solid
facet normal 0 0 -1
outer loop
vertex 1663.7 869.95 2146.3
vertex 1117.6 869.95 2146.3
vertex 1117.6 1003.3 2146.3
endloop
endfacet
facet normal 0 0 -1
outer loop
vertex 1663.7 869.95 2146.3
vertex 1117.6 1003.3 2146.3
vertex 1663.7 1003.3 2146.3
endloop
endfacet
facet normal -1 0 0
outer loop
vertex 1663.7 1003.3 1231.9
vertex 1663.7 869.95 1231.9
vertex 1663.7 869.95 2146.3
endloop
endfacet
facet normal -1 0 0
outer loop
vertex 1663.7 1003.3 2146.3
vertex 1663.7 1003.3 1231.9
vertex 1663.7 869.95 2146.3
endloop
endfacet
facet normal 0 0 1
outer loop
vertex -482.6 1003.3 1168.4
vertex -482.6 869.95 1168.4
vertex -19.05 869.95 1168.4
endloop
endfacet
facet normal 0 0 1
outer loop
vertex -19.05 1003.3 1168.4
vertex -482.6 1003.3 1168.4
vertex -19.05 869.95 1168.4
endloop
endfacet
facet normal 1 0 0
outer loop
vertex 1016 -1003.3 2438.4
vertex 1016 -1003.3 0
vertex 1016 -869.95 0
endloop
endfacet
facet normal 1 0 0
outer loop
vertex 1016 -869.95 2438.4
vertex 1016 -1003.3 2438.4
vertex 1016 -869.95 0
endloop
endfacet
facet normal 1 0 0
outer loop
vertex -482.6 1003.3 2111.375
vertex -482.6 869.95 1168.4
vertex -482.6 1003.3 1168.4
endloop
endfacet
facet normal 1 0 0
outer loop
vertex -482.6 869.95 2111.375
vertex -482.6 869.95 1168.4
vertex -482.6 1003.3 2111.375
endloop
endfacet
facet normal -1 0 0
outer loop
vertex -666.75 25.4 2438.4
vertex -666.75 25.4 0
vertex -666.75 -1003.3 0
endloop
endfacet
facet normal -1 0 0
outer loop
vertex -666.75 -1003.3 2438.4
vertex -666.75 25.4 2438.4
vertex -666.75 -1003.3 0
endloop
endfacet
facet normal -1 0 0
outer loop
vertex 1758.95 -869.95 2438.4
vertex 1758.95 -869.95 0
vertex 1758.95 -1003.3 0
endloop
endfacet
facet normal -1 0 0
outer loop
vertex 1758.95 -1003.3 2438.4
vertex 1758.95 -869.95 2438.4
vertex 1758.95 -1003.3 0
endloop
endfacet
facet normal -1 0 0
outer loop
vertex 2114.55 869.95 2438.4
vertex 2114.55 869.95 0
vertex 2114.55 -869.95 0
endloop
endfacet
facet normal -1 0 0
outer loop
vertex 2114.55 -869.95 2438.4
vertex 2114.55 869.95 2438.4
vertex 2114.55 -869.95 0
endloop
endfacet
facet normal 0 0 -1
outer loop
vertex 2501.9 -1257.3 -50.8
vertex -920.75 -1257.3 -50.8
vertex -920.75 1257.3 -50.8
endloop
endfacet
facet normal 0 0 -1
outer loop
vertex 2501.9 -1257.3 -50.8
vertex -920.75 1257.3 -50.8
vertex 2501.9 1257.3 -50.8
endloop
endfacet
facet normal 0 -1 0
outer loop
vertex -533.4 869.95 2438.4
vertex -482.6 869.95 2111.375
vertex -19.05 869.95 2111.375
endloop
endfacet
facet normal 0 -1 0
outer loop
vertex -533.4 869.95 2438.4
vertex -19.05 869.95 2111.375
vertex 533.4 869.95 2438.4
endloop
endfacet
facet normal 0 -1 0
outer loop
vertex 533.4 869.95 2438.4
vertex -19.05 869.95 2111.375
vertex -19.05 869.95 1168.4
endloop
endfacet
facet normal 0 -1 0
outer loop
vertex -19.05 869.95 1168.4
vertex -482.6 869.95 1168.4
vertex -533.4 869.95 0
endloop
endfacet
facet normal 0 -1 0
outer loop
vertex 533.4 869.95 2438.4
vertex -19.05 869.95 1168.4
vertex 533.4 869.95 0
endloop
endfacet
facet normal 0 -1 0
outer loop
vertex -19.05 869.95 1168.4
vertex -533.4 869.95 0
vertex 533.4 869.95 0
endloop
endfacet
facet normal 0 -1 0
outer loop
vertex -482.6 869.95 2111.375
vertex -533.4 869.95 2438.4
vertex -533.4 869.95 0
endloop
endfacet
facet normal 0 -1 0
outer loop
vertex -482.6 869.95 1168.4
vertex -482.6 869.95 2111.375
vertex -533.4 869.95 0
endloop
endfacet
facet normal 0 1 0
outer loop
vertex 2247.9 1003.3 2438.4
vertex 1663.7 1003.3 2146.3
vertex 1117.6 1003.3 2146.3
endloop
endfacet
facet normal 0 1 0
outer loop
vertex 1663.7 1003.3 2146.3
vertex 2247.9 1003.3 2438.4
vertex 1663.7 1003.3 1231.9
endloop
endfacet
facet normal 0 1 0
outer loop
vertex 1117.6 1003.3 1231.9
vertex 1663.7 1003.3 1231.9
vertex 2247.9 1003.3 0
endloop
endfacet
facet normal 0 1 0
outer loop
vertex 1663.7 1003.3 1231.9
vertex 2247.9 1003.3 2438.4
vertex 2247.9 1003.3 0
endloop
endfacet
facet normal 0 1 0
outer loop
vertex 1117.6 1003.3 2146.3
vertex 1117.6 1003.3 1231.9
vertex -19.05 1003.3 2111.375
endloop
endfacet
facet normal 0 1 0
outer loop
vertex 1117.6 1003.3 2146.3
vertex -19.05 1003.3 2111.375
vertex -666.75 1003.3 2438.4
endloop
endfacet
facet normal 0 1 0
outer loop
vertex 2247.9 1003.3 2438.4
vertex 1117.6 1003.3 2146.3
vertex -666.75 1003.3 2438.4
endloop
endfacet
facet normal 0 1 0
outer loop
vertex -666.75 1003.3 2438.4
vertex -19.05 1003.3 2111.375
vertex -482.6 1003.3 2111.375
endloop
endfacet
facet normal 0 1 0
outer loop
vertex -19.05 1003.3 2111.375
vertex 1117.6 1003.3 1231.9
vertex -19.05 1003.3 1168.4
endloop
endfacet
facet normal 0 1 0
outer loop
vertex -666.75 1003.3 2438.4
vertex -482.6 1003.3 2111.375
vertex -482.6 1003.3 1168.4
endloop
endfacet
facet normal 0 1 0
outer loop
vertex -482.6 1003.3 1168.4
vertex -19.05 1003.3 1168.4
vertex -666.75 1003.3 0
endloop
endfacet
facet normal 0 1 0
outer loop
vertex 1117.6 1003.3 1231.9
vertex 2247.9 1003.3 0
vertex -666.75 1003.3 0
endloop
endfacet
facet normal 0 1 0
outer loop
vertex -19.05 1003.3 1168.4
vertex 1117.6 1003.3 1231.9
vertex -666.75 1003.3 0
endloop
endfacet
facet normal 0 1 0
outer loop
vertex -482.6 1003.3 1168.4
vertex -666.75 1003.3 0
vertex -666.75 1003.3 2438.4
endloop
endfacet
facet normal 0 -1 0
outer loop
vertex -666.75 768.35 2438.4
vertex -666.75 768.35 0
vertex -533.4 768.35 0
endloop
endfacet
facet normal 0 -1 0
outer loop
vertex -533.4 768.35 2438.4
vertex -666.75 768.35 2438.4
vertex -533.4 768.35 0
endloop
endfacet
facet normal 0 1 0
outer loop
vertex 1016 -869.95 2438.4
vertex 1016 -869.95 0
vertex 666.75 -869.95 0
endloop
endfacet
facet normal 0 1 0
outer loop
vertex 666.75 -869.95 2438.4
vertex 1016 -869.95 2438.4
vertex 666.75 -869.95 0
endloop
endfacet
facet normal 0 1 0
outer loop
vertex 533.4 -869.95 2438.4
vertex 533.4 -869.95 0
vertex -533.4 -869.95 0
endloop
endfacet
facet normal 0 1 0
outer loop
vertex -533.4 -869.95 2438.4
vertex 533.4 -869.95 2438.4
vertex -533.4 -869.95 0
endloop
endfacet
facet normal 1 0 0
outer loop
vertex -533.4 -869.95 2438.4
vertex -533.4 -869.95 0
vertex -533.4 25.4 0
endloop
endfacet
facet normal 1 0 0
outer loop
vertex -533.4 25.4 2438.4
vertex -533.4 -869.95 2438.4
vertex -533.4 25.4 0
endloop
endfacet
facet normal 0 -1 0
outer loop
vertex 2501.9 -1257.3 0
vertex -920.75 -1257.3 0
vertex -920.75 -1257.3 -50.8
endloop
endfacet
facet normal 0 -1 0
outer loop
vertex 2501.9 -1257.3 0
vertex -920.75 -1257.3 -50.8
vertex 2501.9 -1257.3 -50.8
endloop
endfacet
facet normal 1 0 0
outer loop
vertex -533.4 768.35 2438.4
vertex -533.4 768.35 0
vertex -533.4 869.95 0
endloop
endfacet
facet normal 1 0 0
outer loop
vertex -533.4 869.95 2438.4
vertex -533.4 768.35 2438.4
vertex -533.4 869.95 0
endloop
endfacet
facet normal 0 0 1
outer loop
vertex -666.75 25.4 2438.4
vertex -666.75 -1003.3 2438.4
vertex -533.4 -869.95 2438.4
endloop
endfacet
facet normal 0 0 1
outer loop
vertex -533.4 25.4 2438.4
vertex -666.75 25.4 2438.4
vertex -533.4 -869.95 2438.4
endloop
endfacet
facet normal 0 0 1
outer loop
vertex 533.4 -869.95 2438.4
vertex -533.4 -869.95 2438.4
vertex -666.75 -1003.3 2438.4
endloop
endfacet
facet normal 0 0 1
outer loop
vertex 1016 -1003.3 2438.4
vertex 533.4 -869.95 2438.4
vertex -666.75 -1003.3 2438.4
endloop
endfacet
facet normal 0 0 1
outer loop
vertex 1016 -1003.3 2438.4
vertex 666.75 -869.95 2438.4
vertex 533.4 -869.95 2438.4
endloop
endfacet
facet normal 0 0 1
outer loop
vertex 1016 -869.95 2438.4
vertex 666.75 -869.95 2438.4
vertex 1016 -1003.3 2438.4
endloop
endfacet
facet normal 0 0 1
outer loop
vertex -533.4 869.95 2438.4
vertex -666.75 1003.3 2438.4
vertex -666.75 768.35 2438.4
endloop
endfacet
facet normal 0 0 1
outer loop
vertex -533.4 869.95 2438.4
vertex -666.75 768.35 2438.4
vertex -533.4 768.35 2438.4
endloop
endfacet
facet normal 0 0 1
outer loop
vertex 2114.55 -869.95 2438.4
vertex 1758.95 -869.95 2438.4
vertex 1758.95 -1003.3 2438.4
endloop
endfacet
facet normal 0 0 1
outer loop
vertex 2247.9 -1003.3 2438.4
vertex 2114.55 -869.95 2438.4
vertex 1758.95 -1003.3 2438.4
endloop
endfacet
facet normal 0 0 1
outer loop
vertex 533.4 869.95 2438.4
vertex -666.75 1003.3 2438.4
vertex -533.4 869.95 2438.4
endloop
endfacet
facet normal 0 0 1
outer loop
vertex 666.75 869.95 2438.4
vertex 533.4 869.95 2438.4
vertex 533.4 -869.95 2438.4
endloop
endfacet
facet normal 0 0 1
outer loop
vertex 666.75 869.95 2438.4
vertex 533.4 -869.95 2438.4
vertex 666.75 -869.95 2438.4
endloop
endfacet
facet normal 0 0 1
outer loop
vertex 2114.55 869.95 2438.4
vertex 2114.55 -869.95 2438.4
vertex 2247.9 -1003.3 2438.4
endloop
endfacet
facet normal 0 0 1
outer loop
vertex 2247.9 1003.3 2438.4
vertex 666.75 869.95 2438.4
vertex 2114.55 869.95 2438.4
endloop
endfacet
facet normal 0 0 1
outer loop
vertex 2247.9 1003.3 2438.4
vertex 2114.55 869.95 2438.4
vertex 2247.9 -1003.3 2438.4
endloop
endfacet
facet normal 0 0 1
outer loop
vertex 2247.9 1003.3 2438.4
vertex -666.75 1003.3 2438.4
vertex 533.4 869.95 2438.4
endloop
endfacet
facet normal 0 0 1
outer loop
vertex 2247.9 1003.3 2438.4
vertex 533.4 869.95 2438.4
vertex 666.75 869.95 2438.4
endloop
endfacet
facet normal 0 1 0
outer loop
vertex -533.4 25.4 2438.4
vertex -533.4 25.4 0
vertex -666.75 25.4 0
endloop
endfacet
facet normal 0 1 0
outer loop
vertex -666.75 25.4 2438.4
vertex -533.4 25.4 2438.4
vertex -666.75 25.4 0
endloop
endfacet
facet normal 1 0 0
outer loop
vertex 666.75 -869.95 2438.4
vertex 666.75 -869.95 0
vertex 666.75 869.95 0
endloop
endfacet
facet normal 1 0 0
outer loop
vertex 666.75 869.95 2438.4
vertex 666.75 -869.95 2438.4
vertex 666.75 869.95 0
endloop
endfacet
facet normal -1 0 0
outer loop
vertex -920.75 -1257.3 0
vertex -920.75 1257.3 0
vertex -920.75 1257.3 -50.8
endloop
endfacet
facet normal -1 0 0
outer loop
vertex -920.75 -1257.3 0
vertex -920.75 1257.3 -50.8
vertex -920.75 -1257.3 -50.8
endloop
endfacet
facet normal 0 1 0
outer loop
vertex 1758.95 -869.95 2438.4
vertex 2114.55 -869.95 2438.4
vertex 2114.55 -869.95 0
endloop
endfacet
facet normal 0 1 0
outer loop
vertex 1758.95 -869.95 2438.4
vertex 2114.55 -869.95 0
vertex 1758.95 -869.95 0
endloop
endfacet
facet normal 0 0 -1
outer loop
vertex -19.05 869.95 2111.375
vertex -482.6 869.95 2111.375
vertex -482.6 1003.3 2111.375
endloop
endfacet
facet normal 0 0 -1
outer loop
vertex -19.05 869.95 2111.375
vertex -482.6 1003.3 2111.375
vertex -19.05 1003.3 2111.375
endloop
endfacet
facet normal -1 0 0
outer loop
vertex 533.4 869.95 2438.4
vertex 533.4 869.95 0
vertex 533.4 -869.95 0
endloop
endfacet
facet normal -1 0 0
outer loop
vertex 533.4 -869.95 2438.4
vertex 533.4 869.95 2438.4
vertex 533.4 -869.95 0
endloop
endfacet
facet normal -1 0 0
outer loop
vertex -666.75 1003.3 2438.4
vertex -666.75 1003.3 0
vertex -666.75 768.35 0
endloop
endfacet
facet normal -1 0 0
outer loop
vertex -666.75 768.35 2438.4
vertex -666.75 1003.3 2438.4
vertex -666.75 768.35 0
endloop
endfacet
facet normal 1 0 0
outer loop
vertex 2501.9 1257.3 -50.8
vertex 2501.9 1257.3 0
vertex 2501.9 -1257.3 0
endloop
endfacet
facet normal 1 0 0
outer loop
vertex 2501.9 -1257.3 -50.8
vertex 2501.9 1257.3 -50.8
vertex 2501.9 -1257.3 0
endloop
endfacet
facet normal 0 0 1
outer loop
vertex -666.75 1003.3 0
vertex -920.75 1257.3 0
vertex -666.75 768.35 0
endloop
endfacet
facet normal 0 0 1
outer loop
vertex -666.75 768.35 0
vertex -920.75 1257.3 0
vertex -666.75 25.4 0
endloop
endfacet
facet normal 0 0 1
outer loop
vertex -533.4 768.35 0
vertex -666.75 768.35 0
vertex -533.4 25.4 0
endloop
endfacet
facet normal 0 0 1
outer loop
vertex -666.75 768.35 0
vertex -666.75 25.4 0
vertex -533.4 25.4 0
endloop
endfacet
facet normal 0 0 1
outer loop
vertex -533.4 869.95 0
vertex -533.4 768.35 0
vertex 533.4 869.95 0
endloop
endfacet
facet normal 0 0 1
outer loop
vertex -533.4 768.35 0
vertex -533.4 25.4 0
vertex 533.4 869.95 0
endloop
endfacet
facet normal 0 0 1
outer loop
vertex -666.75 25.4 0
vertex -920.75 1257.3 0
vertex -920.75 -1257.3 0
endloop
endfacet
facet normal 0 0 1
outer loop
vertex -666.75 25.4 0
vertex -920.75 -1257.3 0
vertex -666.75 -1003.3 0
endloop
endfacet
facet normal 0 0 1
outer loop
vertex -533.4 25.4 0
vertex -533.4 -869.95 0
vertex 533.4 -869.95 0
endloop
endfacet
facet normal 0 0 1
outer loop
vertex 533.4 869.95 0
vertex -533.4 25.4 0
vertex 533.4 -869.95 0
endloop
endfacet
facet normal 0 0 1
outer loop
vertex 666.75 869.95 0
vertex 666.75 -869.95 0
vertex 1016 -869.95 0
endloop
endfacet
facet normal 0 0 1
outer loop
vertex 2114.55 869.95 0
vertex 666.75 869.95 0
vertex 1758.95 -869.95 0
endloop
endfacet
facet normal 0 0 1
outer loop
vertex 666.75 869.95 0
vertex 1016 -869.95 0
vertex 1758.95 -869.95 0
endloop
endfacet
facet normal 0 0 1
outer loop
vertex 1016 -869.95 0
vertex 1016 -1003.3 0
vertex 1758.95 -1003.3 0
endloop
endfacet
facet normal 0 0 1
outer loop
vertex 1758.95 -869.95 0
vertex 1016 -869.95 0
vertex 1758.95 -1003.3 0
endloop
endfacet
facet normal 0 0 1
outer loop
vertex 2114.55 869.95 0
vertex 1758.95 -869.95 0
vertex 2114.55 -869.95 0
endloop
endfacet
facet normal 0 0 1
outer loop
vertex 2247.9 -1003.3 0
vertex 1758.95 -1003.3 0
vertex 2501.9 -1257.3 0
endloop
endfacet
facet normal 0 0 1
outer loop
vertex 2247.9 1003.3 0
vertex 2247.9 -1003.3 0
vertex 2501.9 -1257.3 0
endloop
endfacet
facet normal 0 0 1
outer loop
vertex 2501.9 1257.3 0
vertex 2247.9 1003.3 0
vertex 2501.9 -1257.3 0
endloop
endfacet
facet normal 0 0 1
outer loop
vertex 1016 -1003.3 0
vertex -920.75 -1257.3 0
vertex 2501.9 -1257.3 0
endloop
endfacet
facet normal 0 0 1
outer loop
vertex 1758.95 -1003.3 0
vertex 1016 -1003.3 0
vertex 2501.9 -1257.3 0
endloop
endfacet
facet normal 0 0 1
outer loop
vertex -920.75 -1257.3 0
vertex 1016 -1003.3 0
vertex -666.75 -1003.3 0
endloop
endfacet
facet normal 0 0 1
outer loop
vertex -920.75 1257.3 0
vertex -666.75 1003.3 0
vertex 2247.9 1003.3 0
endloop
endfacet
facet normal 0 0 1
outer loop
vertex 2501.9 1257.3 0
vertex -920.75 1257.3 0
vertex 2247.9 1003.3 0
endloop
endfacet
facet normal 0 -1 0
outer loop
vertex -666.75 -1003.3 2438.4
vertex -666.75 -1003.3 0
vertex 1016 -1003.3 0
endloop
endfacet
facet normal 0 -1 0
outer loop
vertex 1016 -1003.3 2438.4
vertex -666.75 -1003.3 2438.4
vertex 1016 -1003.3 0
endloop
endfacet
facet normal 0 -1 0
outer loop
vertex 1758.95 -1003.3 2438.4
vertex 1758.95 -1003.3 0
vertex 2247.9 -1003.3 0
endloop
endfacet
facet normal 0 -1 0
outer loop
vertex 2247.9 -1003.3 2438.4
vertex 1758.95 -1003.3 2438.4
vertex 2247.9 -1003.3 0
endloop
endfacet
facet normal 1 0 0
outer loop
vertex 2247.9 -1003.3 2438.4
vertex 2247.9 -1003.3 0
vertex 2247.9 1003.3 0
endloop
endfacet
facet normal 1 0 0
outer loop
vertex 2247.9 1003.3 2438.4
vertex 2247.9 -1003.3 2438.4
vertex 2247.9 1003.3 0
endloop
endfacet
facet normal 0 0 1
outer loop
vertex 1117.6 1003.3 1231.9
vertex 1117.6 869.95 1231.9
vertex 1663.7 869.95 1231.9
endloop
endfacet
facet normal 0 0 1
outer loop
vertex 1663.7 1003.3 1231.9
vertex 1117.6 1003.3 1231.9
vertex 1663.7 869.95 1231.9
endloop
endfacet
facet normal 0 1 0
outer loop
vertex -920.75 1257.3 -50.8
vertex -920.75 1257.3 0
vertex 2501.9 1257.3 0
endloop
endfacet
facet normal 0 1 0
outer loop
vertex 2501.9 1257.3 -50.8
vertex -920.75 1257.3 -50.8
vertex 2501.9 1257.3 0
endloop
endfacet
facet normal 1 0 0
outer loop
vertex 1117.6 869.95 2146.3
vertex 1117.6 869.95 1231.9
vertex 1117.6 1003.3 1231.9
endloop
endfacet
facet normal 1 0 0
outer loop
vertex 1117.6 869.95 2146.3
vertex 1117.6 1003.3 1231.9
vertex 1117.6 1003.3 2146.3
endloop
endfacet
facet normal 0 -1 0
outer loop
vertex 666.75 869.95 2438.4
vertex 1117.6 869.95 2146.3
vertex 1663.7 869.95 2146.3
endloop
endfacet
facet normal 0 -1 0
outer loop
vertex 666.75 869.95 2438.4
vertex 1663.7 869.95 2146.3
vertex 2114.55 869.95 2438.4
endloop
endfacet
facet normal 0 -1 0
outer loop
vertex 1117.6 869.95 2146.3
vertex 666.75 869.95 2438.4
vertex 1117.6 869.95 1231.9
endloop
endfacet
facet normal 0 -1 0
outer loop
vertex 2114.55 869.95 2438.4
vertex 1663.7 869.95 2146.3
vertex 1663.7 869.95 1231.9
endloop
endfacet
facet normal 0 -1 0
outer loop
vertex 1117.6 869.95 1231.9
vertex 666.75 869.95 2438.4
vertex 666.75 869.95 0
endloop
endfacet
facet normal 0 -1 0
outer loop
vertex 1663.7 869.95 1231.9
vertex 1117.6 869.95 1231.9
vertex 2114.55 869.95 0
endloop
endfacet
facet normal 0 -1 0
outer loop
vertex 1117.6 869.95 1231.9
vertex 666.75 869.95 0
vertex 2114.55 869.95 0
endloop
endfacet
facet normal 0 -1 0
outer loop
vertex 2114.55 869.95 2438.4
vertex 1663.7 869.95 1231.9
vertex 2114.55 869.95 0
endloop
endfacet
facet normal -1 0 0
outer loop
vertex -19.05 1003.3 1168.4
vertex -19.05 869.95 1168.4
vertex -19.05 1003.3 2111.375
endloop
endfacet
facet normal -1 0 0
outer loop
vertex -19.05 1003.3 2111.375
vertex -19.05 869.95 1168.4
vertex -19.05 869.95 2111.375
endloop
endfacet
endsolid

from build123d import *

# Parameters (mm, degrees)
F1_DEPTH = 2438.4
F4_W     = 463.55
F4_H     = 942.975
F4_W_2   = 546.1
F4_H_2   = 914.4
F5_DEPTH = 133.351
F6_W     = 3422.65
F6_H     = 2514.6
F7_DEPTH = 50.8


with BuildPart() as f1:
    # F0 (on Top) → F1 (new body)
    with BuildSketch(Plane.XY):
        Polygon((533.4, 869.95), (533.4, -869.95), (-533.4, -869.95), (-533.4, 25.4), (-666.75, 25.4), (-666.75, -1003.3), (1016, -1003.3), (1016, -869.95), (666.75, -869.95), (666.75, 869.95), (2114.55, 869.95), (2114.55, -869.95), (1758.95, -869.95), (1758.95, -1003.3), (2247.9, -1003.3), (2247.9, 1003.3), (-666.75, 1003.3), (-666.75, 768.35), (-533.4, 768.35), (-533.4, 869.95), align=None)
    extrude(amount=F1_DEPTH)

    # F4 (on face) → F5 (cut, through all)
    with BuildSketch(Plane.XZ.offset(-869.95)):
        with Locations((-250.825, 1639.8875)):
            Rectangle(F4_W, F4_H)
        with Locations((1390.65, 1689.1)):
            Rectangle(F4_W_2, F4_H_2)
    extrude(amount=-F5_DEPTH, mode=Mode.SUBTRACT)

    # F6 (on face) → F7 (join)
    with BuildSketch(Plane(origin=(0, 0, 0), x_dir=(1, 0, 0), z_dir=(0, 0, -1))):
        with Locations((790.575, 0)):
            Rectangle(F6_W, F6_H)
    extrude(amount=F7_DEPTH)


solid = f1.part
